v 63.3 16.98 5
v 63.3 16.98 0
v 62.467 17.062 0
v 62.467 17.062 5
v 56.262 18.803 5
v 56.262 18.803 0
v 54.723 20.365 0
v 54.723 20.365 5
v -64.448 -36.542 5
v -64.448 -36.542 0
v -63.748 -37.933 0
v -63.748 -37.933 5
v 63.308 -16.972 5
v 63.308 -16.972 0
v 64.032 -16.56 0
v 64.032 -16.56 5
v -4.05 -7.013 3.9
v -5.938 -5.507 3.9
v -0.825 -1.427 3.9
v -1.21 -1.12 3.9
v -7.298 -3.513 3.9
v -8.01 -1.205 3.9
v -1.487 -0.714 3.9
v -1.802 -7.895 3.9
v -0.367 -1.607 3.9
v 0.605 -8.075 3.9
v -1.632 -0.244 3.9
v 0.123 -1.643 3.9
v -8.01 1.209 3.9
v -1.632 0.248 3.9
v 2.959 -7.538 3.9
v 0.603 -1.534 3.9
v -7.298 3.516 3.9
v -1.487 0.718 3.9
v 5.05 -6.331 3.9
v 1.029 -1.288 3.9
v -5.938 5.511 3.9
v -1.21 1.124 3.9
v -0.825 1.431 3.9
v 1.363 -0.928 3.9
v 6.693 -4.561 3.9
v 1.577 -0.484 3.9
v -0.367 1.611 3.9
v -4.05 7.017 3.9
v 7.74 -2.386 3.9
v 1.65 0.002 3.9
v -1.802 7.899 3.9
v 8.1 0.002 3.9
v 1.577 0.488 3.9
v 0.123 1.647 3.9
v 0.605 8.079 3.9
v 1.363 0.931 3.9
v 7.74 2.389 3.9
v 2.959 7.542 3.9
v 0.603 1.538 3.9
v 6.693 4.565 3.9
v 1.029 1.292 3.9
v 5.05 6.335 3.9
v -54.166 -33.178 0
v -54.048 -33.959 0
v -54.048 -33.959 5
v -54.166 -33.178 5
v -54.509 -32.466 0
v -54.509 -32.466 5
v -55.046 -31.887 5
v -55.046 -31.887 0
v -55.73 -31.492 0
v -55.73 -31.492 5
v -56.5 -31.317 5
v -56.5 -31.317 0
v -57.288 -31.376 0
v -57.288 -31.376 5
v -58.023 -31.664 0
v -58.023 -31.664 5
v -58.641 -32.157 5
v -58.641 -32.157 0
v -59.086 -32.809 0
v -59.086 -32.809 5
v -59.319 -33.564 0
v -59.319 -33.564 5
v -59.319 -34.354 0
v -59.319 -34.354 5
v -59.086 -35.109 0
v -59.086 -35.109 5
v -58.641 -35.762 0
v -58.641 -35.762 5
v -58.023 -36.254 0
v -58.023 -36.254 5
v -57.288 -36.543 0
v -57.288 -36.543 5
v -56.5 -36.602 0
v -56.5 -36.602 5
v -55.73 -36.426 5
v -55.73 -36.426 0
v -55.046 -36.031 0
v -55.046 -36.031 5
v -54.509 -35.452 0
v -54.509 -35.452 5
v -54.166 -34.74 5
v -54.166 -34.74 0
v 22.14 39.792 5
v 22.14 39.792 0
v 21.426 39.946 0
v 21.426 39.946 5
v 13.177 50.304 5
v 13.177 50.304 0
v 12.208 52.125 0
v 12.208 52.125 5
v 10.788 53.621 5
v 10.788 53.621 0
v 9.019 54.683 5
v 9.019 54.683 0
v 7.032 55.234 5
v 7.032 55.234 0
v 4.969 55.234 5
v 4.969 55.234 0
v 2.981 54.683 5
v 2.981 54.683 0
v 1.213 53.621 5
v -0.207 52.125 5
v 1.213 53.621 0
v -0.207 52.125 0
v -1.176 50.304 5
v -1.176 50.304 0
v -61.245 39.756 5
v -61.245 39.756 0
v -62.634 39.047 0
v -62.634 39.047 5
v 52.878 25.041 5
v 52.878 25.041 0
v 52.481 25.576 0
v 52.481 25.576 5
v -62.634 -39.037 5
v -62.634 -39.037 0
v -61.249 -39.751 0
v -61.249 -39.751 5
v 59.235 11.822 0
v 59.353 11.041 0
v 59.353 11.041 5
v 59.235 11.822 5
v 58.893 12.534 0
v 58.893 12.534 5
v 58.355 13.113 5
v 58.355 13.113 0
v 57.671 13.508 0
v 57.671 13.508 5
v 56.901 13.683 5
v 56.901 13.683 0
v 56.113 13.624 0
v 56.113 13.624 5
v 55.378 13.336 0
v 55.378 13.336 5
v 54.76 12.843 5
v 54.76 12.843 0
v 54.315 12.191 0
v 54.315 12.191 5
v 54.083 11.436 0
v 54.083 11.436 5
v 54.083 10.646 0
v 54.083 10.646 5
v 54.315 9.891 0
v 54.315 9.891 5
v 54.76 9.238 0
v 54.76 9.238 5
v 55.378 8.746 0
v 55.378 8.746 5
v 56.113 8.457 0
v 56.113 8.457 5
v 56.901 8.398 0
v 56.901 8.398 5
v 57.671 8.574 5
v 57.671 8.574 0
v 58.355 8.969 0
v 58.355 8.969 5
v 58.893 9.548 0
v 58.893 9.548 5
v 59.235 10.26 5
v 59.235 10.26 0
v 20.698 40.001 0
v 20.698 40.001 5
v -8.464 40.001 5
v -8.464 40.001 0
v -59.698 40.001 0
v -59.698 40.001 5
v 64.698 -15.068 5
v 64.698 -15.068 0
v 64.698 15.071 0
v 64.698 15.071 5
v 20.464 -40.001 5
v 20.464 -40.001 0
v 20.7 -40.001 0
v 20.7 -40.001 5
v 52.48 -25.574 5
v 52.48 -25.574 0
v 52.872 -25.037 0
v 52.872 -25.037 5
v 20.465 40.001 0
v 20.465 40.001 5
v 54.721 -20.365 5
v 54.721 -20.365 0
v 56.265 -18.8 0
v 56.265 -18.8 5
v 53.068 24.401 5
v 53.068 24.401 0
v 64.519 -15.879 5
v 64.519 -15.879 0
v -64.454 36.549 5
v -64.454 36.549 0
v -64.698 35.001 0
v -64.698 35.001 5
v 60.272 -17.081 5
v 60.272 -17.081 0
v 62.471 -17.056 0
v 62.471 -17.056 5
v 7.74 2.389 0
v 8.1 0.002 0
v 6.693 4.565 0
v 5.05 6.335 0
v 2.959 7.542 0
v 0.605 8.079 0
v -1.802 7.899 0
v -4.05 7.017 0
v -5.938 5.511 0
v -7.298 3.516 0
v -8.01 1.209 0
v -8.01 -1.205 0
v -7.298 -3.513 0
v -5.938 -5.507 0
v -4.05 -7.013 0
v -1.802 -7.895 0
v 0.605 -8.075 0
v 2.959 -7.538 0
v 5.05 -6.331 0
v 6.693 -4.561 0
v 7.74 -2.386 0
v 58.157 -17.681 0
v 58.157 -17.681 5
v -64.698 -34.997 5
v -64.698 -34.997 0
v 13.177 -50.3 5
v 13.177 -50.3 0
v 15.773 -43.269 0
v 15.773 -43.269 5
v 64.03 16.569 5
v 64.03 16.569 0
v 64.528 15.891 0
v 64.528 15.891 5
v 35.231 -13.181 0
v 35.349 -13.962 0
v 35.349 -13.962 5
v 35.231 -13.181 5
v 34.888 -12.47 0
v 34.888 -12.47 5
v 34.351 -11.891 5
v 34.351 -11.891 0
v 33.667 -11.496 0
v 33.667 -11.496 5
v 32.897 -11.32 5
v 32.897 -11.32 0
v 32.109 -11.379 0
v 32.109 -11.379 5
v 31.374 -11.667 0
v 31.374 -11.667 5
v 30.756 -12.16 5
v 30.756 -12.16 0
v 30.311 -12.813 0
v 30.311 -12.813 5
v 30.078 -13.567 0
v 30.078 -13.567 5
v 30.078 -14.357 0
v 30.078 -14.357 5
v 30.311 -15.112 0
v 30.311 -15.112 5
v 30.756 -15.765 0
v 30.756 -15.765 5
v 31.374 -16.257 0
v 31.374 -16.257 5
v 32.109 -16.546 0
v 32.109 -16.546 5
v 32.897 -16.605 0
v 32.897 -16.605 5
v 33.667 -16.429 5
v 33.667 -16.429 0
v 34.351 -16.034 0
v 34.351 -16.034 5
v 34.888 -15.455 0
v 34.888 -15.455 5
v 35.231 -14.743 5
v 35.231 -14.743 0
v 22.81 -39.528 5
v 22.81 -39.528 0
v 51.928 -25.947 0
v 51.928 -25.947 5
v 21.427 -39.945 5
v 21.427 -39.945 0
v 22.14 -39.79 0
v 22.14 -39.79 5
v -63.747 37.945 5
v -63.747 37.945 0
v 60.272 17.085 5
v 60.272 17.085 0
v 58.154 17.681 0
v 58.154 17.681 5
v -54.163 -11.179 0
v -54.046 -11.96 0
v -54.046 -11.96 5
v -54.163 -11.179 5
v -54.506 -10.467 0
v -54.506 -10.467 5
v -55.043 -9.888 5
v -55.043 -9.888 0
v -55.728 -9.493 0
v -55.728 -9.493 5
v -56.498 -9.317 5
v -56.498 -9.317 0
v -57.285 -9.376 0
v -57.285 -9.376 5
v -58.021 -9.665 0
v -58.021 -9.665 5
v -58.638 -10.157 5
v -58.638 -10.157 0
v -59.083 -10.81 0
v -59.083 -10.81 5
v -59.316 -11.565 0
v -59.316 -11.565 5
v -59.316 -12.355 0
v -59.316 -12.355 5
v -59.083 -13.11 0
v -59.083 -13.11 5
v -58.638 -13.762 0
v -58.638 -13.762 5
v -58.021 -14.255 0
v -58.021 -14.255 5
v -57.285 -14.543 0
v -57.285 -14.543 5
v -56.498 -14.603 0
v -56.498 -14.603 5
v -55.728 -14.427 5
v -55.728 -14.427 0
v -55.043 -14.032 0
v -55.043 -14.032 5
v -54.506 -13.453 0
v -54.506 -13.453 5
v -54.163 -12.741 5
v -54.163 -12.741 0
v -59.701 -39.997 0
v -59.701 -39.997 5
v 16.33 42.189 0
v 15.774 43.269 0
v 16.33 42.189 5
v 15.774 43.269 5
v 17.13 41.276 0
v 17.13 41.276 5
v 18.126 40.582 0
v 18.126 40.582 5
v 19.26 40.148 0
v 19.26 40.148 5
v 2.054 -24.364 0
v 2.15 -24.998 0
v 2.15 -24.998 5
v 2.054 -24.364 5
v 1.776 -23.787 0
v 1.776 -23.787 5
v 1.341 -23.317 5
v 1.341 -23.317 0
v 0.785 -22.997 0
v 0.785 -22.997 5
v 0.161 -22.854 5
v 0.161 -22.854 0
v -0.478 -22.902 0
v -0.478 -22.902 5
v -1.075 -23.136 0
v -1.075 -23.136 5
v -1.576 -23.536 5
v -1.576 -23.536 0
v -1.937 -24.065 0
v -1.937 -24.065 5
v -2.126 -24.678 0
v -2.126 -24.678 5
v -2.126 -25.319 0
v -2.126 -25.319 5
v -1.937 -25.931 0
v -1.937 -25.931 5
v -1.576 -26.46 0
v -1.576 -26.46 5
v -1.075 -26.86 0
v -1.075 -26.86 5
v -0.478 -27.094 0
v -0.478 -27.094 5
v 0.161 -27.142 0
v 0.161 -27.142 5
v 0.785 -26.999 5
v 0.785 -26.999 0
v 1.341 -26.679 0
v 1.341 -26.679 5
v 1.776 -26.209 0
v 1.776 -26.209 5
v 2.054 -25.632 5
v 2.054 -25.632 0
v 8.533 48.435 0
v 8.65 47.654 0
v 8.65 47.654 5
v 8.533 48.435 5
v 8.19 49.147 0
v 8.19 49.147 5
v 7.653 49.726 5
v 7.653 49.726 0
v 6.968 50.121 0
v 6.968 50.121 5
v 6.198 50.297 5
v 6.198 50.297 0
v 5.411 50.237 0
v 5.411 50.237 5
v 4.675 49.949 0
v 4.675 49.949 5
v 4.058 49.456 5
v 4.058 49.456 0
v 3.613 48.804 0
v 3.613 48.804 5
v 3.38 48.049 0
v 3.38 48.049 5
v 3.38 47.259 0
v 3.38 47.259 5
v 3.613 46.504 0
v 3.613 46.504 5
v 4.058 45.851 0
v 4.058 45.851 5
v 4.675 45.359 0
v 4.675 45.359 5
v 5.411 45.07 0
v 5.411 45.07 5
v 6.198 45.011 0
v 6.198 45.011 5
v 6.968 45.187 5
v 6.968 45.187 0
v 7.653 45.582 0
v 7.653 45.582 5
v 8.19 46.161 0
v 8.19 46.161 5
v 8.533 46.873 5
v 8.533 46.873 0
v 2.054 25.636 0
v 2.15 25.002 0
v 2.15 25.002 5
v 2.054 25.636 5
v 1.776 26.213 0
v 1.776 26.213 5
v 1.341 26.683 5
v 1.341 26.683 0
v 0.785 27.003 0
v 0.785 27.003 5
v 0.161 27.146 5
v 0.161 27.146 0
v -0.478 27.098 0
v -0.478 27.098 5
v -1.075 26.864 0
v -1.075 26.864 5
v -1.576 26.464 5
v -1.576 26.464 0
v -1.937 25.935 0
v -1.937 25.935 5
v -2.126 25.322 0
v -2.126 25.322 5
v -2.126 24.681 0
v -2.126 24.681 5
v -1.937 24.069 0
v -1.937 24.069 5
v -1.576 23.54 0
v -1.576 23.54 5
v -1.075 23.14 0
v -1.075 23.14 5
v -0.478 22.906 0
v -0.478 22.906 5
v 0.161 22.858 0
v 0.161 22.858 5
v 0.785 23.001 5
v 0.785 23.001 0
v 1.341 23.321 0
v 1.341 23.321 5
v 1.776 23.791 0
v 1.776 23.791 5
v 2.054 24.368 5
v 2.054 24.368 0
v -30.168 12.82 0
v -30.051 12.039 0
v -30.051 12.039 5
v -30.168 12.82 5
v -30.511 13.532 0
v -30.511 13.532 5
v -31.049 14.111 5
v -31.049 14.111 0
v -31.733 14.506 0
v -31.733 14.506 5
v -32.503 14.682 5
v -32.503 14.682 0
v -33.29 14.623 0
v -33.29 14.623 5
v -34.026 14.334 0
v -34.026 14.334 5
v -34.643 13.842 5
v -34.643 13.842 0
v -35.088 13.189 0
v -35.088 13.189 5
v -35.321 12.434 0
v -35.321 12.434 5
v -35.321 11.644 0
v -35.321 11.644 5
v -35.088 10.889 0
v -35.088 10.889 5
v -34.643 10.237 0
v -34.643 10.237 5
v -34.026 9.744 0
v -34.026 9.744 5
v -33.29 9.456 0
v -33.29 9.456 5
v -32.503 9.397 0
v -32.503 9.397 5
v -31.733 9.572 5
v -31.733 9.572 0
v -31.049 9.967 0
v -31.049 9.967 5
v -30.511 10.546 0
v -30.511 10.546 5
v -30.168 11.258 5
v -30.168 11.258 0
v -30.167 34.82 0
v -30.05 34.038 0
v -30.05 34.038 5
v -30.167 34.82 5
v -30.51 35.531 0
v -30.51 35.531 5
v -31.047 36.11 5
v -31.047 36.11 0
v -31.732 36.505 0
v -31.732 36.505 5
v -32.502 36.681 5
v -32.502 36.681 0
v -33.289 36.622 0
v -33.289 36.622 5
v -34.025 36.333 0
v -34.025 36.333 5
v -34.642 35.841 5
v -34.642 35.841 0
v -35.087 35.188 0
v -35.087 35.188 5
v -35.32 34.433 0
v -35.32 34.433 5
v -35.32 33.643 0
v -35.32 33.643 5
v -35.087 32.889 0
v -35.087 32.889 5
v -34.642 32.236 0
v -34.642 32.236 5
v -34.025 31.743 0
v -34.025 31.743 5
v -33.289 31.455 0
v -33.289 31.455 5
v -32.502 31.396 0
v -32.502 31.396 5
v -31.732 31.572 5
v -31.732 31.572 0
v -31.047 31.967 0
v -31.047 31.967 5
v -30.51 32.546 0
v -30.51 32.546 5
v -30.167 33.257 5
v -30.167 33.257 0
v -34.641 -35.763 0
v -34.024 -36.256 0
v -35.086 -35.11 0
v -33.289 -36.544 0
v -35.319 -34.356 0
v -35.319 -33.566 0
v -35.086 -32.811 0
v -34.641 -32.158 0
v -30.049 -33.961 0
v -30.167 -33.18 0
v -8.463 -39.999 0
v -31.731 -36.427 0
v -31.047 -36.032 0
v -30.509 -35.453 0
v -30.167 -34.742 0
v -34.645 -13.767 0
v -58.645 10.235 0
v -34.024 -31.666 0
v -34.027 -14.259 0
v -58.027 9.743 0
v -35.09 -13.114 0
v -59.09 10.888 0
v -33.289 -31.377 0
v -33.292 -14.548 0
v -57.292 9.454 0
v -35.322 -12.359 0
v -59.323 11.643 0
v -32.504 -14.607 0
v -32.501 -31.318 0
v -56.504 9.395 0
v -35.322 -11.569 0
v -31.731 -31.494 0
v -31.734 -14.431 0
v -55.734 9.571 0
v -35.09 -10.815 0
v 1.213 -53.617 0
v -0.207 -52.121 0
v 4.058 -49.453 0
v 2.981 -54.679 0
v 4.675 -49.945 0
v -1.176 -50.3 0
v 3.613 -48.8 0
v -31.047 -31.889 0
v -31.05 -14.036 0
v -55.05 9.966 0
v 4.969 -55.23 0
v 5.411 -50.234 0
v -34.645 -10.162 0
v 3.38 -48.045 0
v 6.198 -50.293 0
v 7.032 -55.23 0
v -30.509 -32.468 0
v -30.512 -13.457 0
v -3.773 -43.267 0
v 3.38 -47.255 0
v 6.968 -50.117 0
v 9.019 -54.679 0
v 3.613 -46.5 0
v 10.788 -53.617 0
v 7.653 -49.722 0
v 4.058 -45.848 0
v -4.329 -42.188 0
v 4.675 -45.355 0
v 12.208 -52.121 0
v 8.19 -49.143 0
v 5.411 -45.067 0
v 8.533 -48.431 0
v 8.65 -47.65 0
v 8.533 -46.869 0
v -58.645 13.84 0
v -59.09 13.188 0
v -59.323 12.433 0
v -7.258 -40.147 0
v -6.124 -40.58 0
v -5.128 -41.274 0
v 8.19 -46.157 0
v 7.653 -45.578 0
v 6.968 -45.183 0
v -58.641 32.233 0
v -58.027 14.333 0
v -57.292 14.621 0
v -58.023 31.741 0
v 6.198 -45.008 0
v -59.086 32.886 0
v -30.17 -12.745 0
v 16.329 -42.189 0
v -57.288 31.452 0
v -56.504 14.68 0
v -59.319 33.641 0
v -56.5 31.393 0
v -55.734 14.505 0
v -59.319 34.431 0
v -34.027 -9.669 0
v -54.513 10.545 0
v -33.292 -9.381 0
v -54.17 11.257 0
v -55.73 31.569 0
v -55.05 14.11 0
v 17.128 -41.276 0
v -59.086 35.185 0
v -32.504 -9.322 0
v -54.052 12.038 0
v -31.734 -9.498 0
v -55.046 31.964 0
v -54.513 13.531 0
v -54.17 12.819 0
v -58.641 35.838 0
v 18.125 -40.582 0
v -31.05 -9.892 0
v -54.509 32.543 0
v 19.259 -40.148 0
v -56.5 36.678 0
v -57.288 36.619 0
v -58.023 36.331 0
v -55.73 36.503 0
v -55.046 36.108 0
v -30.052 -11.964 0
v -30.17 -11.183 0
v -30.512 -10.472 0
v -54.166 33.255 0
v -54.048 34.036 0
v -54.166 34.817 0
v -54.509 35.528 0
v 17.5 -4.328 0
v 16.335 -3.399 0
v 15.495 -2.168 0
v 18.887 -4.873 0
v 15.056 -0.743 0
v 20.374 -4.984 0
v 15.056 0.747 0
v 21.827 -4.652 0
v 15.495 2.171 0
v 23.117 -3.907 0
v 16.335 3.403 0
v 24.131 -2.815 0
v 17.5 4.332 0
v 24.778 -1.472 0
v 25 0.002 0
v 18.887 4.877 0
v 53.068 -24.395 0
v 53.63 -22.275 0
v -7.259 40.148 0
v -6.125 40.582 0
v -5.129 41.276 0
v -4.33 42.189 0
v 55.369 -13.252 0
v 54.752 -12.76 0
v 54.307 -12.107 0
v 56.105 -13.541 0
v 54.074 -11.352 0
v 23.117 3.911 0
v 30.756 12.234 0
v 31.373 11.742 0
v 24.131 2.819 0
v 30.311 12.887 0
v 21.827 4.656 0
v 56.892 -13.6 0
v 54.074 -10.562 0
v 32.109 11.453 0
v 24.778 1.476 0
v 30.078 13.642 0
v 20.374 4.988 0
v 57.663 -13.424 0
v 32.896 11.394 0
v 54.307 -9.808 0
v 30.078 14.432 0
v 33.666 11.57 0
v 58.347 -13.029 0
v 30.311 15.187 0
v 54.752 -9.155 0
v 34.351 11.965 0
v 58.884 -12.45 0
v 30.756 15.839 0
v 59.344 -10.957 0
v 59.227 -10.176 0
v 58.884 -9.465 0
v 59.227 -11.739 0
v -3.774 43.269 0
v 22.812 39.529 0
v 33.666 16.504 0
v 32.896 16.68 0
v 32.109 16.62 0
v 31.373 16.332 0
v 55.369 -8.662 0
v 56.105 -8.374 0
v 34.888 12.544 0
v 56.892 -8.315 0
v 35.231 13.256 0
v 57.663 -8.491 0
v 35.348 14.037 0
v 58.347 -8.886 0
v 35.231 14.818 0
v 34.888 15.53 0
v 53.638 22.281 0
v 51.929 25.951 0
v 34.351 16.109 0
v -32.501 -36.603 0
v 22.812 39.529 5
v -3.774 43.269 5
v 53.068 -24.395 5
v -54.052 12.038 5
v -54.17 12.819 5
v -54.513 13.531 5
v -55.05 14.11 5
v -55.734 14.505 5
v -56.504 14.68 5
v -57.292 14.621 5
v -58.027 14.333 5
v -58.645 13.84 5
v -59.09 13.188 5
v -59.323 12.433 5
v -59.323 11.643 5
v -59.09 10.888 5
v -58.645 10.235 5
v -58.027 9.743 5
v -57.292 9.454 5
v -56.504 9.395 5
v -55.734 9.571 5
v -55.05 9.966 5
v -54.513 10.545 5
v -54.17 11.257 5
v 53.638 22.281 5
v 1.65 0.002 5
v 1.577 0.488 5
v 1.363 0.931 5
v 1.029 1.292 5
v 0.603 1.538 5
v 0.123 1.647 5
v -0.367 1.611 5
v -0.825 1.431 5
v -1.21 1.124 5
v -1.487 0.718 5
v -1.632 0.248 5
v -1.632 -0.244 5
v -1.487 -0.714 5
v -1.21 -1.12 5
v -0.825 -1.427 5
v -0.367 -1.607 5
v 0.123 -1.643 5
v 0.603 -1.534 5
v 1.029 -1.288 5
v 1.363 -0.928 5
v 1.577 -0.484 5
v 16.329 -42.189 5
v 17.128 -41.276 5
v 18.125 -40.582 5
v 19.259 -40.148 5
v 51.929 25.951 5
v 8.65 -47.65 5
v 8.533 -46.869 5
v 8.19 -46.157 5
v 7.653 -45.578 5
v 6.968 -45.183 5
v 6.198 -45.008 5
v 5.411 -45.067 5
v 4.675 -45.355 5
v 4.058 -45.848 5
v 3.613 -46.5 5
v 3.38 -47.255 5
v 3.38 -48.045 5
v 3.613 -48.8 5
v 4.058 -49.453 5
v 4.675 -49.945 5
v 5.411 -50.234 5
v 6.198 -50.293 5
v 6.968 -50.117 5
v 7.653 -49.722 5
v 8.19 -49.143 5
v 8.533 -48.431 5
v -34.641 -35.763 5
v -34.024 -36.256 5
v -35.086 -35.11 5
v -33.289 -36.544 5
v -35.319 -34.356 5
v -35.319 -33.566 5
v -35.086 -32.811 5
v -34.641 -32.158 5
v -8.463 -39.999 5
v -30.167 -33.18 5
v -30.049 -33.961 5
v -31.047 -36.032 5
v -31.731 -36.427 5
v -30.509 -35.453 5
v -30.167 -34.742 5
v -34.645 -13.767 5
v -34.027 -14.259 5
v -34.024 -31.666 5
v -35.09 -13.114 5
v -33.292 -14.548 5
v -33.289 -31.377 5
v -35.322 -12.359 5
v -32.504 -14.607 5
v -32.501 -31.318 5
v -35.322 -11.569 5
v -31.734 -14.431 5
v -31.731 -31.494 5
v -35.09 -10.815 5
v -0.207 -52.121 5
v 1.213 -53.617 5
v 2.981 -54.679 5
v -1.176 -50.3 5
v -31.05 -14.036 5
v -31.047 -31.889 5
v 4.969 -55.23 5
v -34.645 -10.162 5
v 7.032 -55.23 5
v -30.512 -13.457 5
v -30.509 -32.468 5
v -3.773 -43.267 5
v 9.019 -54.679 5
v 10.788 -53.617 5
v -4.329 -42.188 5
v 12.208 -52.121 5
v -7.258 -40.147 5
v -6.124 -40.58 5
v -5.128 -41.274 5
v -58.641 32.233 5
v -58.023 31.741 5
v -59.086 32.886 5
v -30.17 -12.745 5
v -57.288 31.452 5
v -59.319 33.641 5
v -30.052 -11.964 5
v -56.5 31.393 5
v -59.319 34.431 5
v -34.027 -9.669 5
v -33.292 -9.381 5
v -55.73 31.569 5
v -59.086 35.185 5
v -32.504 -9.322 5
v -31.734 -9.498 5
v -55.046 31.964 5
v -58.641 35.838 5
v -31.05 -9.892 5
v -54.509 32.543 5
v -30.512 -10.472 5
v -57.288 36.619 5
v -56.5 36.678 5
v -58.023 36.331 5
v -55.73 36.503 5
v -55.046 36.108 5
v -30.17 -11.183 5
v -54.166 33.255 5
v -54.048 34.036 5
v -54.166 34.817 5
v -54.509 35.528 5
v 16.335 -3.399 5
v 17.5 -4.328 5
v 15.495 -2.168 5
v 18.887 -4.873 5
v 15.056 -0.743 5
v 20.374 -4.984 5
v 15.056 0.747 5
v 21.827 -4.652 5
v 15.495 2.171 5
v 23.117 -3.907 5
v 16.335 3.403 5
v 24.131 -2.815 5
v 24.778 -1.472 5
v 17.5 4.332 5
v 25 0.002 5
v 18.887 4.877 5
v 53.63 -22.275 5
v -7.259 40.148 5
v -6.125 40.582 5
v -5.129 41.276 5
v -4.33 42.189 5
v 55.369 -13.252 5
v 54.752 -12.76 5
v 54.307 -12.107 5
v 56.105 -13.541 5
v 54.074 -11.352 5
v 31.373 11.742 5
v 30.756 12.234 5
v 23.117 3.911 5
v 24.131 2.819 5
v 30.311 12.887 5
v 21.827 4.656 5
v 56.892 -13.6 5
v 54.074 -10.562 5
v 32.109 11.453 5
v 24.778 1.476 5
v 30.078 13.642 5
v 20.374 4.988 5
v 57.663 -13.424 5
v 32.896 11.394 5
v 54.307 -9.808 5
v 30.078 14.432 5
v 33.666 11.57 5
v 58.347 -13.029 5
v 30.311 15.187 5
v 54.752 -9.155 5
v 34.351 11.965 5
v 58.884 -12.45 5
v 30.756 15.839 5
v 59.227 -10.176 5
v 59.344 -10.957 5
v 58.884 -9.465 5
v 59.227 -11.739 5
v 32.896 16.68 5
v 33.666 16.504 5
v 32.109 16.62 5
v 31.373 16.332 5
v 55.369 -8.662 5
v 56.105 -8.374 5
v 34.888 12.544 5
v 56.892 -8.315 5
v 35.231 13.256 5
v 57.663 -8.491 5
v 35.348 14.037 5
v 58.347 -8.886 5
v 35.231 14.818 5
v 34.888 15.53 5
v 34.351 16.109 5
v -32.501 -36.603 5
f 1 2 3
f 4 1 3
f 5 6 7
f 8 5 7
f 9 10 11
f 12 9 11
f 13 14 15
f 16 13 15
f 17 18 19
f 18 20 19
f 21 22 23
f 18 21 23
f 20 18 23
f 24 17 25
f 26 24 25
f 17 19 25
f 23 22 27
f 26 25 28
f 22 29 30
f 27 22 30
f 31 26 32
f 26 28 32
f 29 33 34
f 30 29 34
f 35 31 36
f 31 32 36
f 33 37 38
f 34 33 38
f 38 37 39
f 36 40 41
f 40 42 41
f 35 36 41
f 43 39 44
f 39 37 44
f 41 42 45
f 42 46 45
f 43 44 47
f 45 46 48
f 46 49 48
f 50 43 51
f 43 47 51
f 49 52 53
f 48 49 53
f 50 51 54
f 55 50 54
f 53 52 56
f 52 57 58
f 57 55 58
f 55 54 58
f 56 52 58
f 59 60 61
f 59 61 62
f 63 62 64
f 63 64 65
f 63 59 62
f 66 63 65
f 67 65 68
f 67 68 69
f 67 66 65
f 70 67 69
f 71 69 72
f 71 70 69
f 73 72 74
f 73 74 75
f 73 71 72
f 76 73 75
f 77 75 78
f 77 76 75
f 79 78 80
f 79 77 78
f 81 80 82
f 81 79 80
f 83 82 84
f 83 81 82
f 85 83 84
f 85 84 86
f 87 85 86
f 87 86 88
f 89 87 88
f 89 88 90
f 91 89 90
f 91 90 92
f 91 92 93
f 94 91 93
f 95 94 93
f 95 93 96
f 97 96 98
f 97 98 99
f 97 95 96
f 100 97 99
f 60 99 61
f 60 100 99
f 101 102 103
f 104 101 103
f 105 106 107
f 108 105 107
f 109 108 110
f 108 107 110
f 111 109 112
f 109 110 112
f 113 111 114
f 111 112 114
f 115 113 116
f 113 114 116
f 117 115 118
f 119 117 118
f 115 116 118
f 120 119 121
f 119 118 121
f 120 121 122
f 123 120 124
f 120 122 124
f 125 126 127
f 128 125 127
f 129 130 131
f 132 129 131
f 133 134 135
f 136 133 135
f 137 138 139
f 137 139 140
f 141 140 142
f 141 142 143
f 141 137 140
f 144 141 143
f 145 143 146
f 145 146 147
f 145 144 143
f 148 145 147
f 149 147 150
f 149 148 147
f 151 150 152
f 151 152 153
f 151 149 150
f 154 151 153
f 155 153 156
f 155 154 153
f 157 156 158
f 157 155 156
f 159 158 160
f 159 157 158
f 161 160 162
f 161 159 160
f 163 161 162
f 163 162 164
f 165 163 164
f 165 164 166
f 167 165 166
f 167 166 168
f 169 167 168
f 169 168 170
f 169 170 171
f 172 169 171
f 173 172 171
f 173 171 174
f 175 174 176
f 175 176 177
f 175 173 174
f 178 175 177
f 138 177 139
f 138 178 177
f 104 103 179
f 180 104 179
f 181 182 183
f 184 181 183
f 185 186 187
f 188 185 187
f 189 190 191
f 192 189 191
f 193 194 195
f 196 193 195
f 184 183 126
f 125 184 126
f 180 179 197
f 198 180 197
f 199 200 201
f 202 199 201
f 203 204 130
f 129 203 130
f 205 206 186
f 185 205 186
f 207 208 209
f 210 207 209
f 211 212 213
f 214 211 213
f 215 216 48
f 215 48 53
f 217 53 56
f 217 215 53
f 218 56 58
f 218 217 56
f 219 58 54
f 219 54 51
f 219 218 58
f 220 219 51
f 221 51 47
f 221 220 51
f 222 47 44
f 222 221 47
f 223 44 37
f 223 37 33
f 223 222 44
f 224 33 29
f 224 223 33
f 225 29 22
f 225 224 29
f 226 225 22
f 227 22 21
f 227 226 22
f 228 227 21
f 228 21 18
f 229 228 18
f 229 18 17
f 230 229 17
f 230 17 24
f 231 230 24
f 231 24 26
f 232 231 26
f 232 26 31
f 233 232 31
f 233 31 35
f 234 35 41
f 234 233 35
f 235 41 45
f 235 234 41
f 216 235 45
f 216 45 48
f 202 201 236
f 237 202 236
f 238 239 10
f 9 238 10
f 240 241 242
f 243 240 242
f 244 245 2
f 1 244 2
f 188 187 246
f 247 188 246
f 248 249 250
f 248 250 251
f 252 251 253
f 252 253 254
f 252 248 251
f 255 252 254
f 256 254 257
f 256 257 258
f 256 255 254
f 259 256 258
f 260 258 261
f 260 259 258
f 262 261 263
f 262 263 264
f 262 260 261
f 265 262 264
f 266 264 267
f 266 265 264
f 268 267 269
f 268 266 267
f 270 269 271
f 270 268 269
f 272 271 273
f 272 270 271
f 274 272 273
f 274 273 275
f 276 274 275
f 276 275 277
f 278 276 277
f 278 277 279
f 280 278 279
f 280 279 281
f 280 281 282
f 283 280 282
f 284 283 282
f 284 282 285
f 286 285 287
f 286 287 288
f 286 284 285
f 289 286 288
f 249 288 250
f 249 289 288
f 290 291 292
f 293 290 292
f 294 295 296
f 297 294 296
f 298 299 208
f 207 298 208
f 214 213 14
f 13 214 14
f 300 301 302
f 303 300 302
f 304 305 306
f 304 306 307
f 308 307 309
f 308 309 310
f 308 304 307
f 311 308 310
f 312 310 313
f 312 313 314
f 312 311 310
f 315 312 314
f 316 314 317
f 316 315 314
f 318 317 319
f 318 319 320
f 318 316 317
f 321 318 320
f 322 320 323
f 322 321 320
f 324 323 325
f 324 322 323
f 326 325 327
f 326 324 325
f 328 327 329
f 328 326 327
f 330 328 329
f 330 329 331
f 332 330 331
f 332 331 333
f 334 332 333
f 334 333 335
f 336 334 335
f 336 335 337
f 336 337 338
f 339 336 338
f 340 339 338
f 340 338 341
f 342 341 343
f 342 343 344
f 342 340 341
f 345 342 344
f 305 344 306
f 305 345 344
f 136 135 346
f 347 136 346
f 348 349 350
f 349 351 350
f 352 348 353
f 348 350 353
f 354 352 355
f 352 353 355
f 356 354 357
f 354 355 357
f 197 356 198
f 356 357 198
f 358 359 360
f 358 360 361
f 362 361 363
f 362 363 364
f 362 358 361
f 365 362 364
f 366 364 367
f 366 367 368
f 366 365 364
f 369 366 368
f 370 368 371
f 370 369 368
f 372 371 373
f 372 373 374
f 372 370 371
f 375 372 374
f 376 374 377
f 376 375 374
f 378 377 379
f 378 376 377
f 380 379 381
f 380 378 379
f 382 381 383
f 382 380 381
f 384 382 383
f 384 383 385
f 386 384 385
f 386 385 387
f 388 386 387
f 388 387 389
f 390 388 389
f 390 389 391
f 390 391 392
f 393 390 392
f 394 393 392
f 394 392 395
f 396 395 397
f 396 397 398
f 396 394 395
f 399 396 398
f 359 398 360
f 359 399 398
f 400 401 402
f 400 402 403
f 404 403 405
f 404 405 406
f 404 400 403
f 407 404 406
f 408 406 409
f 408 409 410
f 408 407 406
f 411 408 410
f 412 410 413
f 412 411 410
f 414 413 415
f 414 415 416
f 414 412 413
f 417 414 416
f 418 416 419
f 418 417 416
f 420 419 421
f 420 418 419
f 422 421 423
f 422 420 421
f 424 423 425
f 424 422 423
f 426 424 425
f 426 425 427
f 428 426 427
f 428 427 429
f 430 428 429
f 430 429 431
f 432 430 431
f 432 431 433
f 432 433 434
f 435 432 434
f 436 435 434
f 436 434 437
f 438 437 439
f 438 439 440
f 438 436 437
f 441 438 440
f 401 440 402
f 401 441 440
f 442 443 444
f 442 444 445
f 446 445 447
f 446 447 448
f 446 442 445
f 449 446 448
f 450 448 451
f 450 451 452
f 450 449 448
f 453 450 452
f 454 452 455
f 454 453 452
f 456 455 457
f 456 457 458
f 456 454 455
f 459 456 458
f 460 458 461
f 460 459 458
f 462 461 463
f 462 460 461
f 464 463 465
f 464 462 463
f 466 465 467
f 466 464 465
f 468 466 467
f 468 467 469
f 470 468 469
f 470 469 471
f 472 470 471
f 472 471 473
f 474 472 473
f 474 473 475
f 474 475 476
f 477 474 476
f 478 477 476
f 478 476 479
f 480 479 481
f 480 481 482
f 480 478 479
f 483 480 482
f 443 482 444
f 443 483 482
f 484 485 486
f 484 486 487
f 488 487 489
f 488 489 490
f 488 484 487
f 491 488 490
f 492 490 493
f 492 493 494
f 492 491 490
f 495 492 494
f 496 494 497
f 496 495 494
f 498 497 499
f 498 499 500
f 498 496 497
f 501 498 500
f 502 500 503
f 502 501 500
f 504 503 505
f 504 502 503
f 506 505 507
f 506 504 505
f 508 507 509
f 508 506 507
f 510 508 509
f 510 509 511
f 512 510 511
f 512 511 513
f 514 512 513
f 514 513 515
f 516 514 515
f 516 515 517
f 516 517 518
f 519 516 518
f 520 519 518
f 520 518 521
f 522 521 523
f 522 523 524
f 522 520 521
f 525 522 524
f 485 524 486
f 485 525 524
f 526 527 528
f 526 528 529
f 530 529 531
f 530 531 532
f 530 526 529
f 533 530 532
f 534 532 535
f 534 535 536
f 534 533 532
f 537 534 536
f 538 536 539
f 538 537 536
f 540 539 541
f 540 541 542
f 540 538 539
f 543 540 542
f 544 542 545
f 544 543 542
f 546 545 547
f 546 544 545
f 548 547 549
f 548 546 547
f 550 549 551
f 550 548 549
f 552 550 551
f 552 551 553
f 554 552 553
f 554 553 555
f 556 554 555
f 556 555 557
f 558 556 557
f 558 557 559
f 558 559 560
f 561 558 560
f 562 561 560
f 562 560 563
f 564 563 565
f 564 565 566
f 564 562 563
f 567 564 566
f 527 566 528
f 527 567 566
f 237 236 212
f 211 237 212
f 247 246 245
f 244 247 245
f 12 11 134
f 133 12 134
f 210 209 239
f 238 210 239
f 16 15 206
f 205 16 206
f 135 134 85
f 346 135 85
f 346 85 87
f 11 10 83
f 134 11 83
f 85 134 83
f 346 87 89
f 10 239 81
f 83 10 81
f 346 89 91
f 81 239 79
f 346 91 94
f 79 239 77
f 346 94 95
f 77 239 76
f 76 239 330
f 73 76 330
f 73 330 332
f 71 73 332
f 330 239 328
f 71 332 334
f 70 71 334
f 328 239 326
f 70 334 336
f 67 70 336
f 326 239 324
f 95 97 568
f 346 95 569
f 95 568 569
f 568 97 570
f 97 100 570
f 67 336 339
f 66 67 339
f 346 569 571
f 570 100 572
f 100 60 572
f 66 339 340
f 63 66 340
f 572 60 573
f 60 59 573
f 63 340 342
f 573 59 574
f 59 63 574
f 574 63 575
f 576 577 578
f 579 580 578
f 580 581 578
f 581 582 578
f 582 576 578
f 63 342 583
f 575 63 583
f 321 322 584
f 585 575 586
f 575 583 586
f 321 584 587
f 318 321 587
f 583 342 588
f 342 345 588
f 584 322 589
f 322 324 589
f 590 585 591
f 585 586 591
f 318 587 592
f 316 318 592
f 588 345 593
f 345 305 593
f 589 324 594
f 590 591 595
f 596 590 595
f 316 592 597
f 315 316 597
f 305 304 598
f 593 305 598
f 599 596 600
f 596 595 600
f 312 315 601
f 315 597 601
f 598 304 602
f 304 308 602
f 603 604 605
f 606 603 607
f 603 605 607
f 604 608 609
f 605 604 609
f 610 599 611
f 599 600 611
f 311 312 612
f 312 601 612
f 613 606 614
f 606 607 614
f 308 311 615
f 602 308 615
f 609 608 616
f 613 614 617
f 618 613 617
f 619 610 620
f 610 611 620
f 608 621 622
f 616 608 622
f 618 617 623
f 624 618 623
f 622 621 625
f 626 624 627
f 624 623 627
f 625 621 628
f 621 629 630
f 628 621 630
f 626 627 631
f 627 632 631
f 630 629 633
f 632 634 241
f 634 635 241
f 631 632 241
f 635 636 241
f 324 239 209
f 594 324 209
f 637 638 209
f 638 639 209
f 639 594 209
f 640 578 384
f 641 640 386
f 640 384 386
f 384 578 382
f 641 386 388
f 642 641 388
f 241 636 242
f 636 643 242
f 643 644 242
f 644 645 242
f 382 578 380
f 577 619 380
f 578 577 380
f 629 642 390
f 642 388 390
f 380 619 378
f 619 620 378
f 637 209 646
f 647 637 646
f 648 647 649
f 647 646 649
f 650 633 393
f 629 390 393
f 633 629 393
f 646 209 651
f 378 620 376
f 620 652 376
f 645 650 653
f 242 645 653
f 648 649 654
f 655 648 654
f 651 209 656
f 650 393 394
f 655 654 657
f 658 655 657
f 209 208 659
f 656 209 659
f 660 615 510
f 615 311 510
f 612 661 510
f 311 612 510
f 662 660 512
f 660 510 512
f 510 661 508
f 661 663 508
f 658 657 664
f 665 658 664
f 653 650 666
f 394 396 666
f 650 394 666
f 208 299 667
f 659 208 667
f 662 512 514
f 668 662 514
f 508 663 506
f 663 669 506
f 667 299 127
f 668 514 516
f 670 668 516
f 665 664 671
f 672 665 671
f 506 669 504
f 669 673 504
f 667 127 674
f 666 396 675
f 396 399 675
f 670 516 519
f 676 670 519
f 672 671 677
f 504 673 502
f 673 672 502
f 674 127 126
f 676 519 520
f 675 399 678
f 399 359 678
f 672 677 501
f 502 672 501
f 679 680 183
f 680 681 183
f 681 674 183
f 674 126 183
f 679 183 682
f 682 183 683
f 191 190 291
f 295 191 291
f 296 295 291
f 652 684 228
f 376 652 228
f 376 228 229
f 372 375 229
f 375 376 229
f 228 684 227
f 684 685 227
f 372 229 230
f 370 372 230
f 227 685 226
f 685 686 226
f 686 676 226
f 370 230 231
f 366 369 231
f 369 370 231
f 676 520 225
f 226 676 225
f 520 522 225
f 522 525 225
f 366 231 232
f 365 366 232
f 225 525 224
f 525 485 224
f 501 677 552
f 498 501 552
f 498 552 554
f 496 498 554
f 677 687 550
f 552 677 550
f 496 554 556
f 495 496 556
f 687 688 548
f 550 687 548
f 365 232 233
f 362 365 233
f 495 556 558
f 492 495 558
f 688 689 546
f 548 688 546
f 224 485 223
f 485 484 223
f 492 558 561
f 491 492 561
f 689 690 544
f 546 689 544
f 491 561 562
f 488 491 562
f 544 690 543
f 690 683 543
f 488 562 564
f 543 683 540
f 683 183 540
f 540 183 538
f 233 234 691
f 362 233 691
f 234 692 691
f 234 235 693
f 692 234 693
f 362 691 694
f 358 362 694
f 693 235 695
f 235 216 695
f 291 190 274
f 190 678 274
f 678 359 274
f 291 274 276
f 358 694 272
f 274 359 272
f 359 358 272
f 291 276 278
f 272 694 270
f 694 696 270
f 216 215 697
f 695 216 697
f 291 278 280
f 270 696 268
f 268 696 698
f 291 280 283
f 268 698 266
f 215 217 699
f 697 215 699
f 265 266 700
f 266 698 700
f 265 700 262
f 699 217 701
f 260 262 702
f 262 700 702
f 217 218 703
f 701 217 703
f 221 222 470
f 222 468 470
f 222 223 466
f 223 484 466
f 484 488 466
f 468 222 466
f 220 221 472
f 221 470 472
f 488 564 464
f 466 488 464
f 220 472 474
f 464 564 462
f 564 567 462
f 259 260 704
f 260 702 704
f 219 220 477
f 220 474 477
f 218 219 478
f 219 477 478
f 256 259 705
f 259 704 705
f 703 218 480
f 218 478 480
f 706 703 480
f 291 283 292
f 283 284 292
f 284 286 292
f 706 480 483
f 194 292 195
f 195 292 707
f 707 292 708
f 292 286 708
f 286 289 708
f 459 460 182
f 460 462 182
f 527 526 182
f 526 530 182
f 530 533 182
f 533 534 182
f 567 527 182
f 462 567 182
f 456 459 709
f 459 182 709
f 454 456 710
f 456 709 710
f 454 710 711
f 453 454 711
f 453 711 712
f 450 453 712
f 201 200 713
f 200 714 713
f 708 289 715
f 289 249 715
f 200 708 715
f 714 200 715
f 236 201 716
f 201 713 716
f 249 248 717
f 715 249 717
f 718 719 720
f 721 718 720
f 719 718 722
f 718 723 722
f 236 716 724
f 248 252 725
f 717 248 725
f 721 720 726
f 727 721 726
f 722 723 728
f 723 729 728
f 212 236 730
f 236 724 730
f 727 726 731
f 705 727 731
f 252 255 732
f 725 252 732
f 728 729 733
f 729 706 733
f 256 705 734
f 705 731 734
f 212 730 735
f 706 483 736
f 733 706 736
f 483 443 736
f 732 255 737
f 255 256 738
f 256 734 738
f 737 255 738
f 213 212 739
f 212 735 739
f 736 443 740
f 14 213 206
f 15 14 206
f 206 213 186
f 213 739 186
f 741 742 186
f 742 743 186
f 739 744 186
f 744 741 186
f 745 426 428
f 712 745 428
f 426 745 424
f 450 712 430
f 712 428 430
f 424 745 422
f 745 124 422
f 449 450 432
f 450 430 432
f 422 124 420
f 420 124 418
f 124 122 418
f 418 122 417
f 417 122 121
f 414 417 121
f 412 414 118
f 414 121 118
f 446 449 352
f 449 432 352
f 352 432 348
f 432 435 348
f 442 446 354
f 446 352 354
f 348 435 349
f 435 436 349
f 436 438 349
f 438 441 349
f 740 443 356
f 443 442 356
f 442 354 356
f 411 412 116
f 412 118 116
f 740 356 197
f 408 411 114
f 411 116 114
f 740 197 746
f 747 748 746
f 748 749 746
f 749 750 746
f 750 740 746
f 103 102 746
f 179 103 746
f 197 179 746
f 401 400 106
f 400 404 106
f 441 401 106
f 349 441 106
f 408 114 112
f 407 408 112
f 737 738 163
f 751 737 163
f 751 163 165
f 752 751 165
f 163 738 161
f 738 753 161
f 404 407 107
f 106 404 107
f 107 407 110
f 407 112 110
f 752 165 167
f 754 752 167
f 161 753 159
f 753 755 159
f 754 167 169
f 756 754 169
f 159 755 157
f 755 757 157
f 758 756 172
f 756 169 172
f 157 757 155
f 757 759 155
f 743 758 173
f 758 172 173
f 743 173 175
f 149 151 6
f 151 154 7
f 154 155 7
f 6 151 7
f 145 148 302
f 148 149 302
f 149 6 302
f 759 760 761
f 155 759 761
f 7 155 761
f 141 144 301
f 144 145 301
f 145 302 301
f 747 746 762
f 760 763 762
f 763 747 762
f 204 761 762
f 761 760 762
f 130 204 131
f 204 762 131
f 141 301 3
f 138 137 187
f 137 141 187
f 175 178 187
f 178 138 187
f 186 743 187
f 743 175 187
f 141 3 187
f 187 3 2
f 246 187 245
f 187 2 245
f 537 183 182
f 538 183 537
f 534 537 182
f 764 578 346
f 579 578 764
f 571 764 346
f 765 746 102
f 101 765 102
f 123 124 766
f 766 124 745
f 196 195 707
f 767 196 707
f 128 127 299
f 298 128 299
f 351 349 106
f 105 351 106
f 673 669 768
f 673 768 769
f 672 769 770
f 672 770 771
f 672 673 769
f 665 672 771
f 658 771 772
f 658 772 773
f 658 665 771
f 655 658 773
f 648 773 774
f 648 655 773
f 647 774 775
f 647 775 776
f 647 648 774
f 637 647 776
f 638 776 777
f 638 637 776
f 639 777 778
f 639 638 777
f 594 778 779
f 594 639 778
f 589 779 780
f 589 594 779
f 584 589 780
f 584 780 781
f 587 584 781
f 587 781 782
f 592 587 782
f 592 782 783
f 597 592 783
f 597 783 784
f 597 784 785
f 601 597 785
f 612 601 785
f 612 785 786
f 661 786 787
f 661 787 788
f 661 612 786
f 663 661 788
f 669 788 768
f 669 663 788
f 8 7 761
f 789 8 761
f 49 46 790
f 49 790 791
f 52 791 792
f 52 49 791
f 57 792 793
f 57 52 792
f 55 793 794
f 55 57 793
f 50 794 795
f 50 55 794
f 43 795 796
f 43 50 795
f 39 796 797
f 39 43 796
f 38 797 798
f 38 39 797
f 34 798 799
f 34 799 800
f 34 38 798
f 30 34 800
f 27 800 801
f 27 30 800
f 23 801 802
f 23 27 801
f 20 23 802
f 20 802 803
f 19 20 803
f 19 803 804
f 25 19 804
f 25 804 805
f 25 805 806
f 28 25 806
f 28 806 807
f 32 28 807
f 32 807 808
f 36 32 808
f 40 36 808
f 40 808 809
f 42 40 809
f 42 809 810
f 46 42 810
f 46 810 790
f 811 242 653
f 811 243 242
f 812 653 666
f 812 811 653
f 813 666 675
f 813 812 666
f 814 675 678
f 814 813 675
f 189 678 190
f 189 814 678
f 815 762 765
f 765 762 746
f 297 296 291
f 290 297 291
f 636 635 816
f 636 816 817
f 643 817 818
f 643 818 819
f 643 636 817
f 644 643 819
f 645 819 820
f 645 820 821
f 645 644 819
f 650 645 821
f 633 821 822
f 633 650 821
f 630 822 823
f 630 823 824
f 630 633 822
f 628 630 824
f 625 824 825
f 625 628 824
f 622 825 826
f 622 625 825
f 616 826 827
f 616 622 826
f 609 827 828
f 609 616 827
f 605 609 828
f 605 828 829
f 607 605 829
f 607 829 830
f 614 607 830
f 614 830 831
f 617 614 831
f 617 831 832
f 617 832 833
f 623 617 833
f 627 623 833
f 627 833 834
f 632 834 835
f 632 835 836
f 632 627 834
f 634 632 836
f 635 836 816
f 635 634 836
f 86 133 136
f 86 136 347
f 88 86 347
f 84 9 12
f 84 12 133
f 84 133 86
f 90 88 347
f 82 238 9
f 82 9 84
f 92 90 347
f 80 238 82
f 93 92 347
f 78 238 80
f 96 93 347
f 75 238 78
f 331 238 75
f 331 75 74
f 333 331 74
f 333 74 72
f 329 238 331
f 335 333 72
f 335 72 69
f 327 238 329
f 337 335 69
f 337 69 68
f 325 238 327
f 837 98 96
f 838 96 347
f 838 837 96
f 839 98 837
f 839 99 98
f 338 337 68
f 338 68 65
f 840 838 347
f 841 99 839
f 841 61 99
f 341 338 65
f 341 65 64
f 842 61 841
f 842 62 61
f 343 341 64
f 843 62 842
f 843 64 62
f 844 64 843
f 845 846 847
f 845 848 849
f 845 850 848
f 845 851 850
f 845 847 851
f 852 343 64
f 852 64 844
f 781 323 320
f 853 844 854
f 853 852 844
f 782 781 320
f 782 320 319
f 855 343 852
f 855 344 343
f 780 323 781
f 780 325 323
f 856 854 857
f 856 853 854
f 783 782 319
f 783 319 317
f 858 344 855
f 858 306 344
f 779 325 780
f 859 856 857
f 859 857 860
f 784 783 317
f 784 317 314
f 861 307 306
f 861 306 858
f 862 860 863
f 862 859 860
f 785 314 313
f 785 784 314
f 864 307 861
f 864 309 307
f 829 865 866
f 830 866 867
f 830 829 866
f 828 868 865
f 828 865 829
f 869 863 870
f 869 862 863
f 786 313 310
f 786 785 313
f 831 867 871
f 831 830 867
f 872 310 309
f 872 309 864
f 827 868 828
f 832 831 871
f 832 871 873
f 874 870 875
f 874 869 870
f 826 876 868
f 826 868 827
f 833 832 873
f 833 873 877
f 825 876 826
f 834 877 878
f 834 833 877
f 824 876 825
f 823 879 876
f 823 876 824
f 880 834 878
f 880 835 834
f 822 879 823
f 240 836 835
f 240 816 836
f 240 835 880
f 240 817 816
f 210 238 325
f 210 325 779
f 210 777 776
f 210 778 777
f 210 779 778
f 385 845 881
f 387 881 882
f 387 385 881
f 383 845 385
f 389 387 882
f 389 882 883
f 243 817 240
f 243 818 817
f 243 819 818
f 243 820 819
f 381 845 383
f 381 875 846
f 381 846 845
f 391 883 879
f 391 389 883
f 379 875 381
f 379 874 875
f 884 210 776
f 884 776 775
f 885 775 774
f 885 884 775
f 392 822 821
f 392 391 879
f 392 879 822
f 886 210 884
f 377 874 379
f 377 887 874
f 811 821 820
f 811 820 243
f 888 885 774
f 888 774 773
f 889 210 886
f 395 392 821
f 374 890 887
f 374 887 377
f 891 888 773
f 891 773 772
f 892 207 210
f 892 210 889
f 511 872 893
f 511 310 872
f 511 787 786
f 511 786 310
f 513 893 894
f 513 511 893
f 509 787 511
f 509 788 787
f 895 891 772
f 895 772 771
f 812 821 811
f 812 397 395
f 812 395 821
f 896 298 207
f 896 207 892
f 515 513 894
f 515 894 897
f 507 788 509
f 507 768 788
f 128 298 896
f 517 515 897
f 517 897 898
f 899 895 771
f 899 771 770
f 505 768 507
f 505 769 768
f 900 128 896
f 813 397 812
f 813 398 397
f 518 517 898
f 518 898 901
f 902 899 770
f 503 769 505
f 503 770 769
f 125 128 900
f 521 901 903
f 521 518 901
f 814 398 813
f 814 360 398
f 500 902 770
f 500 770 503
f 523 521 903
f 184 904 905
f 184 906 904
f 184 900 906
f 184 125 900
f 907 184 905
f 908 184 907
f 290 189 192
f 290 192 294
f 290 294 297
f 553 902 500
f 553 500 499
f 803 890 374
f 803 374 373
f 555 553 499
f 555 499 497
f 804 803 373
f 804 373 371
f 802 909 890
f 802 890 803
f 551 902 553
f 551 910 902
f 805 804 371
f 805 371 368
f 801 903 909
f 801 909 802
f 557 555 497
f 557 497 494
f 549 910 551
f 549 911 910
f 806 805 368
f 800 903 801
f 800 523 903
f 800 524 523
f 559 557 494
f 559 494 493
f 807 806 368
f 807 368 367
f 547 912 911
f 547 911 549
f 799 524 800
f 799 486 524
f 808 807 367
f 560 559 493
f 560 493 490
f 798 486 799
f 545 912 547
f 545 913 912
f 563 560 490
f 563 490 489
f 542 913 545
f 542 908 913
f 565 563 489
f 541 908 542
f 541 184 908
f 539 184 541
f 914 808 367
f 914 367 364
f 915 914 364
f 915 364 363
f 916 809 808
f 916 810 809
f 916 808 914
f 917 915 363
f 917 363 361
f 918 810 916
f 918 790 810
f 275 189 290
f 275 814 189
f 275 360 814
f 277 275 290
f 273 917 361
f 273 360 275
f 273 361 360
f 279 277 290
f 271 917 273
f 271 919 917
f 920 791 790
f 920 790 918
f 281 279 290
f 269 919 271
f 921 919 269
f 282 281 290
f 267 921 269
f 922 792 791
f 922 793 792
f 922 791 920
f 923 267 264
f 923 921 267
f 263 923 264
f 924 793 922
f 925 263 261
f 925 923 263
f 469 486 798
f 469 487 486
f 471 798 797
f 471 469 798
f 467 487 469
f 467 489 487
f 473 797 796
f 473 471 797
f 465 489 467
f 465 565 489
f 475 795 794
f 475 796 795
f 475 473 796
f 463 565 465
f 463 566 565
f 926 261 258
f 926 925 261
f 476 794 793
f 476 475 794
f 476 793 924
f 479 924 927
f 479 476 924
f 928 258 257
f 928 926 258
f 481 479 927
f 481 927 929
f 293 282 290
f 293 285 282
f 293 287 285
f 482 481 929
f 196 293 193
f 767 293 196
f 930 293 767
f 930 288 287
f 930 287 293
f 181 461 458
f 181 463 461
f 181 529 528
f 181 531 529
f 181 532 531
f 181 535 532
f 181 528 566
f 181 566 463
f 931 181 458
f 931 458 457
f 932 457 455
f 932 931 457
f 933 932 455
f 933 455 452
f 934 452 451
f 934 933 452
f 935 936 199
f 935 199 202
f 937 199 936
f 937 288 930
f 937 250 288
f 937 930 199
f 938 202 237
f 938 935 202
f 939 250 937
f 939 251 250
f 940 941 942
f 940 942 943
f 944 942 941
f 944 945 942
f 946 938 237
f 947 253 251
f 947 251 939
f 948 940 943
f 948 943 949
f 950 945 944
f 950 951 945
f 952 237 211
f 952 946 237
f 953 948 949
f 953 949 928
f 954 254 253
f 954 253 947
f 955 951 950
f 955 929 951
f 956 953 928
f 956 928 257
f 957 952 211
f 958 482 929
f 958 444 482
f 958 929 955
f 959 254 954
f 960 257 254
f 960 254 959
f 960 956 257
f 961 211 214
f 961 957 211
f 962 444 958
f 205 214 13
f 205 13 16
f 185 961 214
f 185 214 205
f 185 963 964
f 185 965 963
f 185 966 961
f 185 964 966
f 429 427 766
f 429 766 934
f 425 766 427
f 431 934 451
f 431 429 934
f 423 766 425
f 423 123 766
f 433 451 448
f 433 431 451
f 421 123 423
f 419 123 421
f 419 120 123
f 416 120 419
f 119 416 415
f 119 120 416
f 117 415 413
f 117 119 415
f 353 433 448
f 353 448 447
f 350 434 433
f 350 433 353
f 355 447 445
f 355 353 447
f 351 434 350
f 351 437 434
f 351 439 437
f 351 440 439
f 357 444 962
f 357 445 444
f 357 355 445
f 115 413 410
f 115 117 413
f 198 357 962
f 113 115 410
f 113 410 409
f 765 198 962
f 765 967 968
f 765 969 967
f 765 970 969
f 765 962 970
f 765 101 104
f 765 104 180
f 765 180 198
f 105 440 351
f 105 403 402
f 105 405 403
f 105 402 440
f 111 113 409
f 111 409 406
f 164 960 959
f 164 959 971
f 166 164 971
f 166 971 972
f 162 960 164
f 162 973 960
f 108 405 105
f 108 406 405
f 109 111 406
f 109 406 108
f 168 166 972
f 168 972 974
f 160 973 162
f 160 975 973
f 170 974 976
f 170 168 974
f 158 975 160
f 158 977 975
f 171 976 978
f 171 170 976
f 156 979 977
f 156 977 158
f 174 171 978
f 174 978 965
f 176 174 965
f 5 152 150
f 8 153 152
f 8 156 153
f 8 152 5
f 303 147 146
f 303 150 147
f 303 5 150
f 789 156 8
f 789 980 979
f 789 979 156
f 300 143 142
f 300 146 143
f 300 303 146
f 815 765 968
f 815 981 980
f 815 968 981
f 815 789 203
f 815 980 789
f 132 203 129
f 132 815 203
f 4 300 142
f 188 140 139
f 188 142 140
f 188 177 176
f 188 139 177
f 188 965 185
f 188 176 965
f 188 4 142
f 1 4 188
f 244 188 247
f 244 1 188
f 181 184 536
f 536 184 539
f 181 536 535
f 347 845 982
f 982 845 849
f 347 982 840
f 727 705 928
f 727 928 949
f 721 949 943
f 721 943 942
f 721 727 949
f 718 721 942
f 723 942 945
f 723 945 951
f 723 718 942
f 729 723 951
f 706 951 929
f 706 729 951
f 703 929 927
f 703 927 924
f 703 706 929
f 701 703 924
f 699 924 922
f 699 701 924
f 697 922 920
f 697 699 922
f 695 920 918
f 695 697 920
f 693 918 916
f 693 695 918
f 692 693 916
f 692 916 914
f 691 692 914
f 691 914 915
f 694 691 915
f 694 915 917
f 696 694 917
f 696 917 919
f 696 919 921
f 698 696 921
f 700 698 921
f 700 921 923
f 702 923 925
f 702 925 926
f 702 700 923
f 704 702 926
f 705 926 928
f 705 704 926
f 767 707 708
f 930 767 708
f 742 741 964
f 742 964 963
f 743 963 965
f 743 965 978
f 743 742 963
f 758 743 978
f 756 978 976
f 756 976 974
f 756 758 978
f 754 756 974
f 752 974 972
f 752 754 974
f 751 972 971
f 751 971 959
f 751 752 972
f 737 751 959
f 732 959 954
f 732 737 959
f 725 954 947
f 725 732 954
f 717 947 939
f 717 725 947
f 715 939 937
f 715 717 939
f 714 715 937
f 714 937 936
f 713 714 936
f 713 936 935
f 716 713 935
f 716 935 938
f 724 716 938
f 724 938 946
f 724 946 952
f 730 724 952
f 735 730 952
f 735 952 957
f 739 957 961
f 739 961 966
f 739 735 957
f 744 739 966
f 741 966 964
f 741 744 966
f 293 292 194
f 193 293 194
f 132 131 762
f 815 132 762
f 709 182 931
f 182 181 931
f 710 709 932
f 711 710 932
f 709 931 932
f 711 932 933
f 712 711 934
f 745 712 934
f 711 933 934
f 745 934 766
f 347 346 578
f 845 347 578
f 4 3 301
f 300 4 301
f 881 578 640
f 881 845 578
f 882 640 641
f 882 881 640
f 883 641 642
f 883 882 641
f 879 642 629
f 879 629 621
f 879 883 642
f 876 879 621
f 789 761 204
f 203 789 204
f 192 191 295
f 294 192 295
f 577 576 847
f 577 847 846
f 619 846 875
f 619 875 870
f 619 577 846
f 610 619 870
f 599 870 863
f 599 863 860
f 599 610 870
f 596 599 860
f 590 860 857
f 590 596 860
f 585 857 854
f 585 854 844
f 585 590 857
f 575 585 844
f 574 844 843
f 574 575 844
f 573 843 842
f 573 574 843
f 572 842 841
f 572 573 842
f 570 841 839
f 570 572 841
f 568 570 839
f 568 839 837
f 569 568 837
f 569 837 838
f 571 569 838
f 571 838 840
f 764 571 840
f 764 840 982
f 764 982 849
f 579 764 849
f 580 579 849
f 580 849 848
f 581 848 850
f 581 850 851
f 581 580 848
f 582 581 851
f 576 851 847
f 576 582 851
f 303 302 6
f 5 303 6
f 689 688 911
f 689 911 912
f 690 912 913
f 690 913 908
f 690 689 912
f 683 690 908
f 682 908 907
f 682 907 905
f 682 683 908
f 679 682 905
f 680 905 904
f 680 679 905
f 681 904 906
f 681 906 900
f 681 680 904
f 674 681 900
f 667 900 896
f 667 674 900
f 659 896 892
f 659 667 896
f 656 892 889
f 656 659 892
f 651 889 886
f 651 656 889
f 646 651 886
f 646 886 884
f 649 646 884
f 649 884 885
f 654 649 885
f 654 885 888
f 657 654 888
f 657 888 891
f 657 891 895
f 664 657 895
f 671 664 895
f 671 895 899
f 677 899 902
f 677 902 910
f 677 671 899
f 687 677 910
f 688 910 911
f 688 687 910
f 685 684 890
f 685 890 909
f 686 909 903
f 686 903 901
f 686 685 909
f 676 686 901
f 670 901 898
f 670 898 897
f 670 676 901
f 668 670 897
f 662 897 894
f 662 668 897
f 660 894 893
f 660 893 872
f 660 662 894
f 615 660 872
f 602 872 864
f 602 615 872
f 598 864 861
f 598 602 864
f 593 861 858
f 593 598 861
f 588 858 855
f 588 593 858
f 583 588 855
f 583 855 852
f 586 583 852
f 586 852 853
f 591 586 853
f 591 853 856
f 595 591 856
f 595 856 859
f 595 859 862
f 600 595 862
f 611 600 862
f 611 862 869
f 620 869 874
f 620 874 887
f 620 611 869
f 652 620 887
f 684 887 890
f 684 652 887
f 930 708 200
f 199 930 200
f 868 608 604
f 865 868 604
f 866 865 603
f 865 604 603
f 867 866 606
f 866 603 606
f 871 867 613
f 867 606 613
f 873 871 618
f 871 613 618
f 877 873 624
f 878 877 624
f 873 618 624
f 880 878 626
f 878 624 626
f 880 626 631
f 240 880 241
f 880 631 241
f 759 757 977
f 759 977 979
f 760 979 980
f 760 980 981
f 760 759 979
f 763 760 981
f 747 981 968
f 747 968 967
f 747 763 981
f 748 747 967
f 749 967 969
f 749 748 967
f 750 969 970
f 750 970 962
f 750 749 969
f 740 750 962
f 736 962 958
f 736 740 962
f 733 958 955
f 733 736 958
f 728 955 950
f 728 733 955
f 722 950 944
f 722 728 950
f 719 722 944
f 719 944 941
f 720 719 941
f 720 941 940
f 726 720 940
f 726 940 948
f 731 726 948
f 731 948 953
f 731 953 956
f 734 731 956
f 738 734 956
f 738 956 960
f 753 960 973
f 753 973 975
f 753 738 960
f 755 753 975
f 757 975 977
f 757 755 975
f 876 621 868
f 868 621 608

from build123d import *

# Parameters (mm, degrees)
F1_R     = 2.65
F1_R_2   = 2.15
F1_R_3   = 8.1
F1_R_4   = 5
F1_R_5   = 1.65
F2_DEPTH = 5
F3_DEPTH = 3.9
F4_R     = 5


with BuildPart() as f2:
    # F1 (on Top) → F2 (new body)
    with BuildSketch(Plane.XY):
        with BuildLine():
            Line((-64.4537, 36.5492), (-64.6979, 35.0007))
            Line((-64.6979, 35.0007), (-64.6979, -34.9969))
            Line((-64.6979, -34.9969), (-64.4484, -36.5417))
            Line((-64.4484, -36.5417), (-63.7479, -37.9332))
            Line((-63.7479, -37.9332), (-62.6335, -39.0374))
            Line((-62.6335, -39.0374), (-61.2488, -39.7513))
            Line((-61.2488, -39.7513), (-59.7007, -39.9967))
            Line((-59.7007, -39.9967), (-4.979727, -39.999559))
            Line((-4.979727, -39.999559), (-1.17605, -50.300132))
            ThreePointArc((-1.17605, -50.300132), (6.0003, -55.300132), (13.17665, -50.300132))
            Line((13.17665, -50.300132), (16.979904, -40.000706))
            Line((16.979904, -40.000706), (20.6995, -40.0009))
            Line((20.6995, -40.0009), (21.4269, -39.9453))
            Line((21.4269, -39.9453), (22.1399, -39.7905))
            Line((22.1399, -39.7905), (22.8102, -39.5276))
            Line((22.8102, -39.5276), (51.9283, -25.9473))
            Line((51.9283, -25.9473), (52.4796, -25.5742))
            Line((52.4796, -25.5742), (52.8725, -25.0372))
            Line((52.8725, -25.0372), (53.0678, -24.3953))
            Line((53.0678, -24.3953), (53.6298, -22.2747))
            Line((53.6298, -22.2747), (54.7211, -20.3647))
            Line((54.7211, -20.3647), (56.2653, -18.7999))
            Line((56.2653, -18.7999), (58.1567, -17.6809))
            Line((58.1567, -17.6809), (60.2719, -17.0814))
            Line((60.2719, -17.0814), (62.4712, -17.0559))
            Line((62.4712, -17.0559), (63.308, -16.9719))
            Line((63.308, -16.9719), (64.0317, -16.5604))
            Line((64.0317, -16.5604), (64.5194, -15.8794))
            Line((64.5194, -15.8794), (64.6979, -15.0676))
            Line((64.6979, -15.0676), (64.6979, 15.0714))
            Line((64.6979, 15.0714), (64.5279, 15.8914))
            Line((64.5279, 15.8914), (64.0302, 16.5693))
            Line((64.0302, 16.5693), (63.3002, 16.9797))
            Line((63.3002, 16.9797), (62.4669, 17.0619))
            Line((62.4669, 17.0619), (60.2718, 17.0848))
            Line((60.2718, 17.0848), (58.1543, 17.681))
            Line((58.1543, 17.681), (56.2623, 18.8029))
            Line((56.2623, 18.8029), (54.7233, 20.3646))
            Line((54.7233, 20.3646), (53.6382, 22.281))
            Line((53.6382, 22.281), (53.0683, 24.401))
            Line((53.0683, 24.401), (52.8783, 25.0411))
            Line((52.8783, 25.0411), (52.4811, 25.5759))
            Line((52.4811, 25.5759), (51.9289, 25.9507))
            Line((51.9289, 25.9507), (22.812, 39.5287))
            Line((22.812, 39.5287), (22.1399, 39.7917))
            Line((22.1399, 39.7917), (21.4259, 39.9459))
            Line((21.4259, 39.9459), (20.6976, 40.0009))
            Line((20.6976, 40.0009), (16.98124, 40.000886))
            Line((16.98124, 40.000886), (13.17665, 50.303932))
            ThreePointArc((13.17665, 50.303932), (6.0003, 55.303932), (-1.17605, 50.303932))
            Line((-1.17605, 50.303932), (-4.980671, 40.000804))
            Line((-4.980671, 40.000804), (-59.6981, 40.0006))
            Line((-59.6981, 40.0006), (-61.245, 39.7556))
            Line((-61.245, 39.7556), (-62.6341, 39.0468))
            Line((-62.6341, 39.0468), (-63.7466, 37.9452))
            Line((-63.7466, 37.9452), (-64.4537, 36.5492))
        make_face()
        with Locations((-56.6982, -33.959099)):
            Circle(F1_R, mode=Mode.SUBTRACT)
        with Locations((-32.6989, -33.960634)):
            Circle(F1_R, mode=Mode.SUBTRACT)
        with Locations((-56.6957, -11.959936)):
            Circle(F1_R, mode=Mode.SUBTRACT)
        with Locations((-32.702, -11.964319)):
            Circle(F1_R, mode=Mode.SUBTRACT)
        with Locations((6.0003, -47.650132)):
            Circle(F1_R, mode=Mode.SUBTRACT)
        with Locations((0, -24.9981)):
            Circle(F1_R_2, mode=Mode.SUBTRACT)
        with Locations((32.6989, -13.962368)):
            Circle(F1_R, mode=Mode.SUBTRACT)
        with Locations((56.6944, -10.95745)):
            Circle(F1_R, mode=Mode.SUBTRACT)
        with Locations((-56.7023, 12.03785)):
            Circle(F1_R, mode=Mode.SUBTRACT)
        with Locations((-32.70075, 12.03915)):
            Circle(F1_R, mode=Mode.SUBTRACT)
        with Locations((-56.6982, 34.0357)):
            Circle(F1_R, mode=Mode.SUBTRACT)
        with Locations((-32.6997, 34.03845)):
            Circle(F1_R, mode=Mode.SUBTRACT)
        with Locations((0, 0.0019)):
            Circle(F1_R_3, mode=Mode.SUBTRACT)
        with Locations((20, 0.0019)):
            Circle(F1_R_4, mode=Mode.SUBTRACT)
        with Locations((0, 25.0019)):
            Circle(F1_R_2, mode=Mode.SUBTRACT)
        with Locations((56.703, 11.04075)):
            Circle(F1_R, mode=Mode.SUBTRACT)
        with Locations((32.698325, 14.036925)):
            Circle(F1_R, mode=Mode.SUBTRACT)
        with Locations((6.0003, 47.653932)):
            Circle(F1_R, mode=Mode.SUBTRACT)
        with Locations((0, 0.0019)):
            Circle(F1_R_3)
        with Locations((0, 0.0019)):
            Circle(F1_R_5, mode=Mode.SUBTRACT)
    extrude(amount=F2_DEPTH)

    # F1 (on Top) → F3 (cut)
    with BuildSketch(Plane.XY):
        with Locations((0, 0.0019)):
            Circle(F1_R_3)
        with Locations((0, 0.0019)):
            Circle(F1_R_5, mode=Mode.SUBTRACT)
    extrude(amount=F3_DEPTH, mode=Mode.SUBTRACT)

    # F4
    f4_edges = [f2.edges().sort_by_distance(p)[0] for p in [
        (-4.979727, -39.999559, 2.5),
        (16.979904, -40.000706, 2.5),
        (-4.980671, 40.000804, 2.5),
        (16.98124, 40.000886, 2.5),
    ]]
    fillet(f4_edges, radius=F4_R)


solid = f2.part
